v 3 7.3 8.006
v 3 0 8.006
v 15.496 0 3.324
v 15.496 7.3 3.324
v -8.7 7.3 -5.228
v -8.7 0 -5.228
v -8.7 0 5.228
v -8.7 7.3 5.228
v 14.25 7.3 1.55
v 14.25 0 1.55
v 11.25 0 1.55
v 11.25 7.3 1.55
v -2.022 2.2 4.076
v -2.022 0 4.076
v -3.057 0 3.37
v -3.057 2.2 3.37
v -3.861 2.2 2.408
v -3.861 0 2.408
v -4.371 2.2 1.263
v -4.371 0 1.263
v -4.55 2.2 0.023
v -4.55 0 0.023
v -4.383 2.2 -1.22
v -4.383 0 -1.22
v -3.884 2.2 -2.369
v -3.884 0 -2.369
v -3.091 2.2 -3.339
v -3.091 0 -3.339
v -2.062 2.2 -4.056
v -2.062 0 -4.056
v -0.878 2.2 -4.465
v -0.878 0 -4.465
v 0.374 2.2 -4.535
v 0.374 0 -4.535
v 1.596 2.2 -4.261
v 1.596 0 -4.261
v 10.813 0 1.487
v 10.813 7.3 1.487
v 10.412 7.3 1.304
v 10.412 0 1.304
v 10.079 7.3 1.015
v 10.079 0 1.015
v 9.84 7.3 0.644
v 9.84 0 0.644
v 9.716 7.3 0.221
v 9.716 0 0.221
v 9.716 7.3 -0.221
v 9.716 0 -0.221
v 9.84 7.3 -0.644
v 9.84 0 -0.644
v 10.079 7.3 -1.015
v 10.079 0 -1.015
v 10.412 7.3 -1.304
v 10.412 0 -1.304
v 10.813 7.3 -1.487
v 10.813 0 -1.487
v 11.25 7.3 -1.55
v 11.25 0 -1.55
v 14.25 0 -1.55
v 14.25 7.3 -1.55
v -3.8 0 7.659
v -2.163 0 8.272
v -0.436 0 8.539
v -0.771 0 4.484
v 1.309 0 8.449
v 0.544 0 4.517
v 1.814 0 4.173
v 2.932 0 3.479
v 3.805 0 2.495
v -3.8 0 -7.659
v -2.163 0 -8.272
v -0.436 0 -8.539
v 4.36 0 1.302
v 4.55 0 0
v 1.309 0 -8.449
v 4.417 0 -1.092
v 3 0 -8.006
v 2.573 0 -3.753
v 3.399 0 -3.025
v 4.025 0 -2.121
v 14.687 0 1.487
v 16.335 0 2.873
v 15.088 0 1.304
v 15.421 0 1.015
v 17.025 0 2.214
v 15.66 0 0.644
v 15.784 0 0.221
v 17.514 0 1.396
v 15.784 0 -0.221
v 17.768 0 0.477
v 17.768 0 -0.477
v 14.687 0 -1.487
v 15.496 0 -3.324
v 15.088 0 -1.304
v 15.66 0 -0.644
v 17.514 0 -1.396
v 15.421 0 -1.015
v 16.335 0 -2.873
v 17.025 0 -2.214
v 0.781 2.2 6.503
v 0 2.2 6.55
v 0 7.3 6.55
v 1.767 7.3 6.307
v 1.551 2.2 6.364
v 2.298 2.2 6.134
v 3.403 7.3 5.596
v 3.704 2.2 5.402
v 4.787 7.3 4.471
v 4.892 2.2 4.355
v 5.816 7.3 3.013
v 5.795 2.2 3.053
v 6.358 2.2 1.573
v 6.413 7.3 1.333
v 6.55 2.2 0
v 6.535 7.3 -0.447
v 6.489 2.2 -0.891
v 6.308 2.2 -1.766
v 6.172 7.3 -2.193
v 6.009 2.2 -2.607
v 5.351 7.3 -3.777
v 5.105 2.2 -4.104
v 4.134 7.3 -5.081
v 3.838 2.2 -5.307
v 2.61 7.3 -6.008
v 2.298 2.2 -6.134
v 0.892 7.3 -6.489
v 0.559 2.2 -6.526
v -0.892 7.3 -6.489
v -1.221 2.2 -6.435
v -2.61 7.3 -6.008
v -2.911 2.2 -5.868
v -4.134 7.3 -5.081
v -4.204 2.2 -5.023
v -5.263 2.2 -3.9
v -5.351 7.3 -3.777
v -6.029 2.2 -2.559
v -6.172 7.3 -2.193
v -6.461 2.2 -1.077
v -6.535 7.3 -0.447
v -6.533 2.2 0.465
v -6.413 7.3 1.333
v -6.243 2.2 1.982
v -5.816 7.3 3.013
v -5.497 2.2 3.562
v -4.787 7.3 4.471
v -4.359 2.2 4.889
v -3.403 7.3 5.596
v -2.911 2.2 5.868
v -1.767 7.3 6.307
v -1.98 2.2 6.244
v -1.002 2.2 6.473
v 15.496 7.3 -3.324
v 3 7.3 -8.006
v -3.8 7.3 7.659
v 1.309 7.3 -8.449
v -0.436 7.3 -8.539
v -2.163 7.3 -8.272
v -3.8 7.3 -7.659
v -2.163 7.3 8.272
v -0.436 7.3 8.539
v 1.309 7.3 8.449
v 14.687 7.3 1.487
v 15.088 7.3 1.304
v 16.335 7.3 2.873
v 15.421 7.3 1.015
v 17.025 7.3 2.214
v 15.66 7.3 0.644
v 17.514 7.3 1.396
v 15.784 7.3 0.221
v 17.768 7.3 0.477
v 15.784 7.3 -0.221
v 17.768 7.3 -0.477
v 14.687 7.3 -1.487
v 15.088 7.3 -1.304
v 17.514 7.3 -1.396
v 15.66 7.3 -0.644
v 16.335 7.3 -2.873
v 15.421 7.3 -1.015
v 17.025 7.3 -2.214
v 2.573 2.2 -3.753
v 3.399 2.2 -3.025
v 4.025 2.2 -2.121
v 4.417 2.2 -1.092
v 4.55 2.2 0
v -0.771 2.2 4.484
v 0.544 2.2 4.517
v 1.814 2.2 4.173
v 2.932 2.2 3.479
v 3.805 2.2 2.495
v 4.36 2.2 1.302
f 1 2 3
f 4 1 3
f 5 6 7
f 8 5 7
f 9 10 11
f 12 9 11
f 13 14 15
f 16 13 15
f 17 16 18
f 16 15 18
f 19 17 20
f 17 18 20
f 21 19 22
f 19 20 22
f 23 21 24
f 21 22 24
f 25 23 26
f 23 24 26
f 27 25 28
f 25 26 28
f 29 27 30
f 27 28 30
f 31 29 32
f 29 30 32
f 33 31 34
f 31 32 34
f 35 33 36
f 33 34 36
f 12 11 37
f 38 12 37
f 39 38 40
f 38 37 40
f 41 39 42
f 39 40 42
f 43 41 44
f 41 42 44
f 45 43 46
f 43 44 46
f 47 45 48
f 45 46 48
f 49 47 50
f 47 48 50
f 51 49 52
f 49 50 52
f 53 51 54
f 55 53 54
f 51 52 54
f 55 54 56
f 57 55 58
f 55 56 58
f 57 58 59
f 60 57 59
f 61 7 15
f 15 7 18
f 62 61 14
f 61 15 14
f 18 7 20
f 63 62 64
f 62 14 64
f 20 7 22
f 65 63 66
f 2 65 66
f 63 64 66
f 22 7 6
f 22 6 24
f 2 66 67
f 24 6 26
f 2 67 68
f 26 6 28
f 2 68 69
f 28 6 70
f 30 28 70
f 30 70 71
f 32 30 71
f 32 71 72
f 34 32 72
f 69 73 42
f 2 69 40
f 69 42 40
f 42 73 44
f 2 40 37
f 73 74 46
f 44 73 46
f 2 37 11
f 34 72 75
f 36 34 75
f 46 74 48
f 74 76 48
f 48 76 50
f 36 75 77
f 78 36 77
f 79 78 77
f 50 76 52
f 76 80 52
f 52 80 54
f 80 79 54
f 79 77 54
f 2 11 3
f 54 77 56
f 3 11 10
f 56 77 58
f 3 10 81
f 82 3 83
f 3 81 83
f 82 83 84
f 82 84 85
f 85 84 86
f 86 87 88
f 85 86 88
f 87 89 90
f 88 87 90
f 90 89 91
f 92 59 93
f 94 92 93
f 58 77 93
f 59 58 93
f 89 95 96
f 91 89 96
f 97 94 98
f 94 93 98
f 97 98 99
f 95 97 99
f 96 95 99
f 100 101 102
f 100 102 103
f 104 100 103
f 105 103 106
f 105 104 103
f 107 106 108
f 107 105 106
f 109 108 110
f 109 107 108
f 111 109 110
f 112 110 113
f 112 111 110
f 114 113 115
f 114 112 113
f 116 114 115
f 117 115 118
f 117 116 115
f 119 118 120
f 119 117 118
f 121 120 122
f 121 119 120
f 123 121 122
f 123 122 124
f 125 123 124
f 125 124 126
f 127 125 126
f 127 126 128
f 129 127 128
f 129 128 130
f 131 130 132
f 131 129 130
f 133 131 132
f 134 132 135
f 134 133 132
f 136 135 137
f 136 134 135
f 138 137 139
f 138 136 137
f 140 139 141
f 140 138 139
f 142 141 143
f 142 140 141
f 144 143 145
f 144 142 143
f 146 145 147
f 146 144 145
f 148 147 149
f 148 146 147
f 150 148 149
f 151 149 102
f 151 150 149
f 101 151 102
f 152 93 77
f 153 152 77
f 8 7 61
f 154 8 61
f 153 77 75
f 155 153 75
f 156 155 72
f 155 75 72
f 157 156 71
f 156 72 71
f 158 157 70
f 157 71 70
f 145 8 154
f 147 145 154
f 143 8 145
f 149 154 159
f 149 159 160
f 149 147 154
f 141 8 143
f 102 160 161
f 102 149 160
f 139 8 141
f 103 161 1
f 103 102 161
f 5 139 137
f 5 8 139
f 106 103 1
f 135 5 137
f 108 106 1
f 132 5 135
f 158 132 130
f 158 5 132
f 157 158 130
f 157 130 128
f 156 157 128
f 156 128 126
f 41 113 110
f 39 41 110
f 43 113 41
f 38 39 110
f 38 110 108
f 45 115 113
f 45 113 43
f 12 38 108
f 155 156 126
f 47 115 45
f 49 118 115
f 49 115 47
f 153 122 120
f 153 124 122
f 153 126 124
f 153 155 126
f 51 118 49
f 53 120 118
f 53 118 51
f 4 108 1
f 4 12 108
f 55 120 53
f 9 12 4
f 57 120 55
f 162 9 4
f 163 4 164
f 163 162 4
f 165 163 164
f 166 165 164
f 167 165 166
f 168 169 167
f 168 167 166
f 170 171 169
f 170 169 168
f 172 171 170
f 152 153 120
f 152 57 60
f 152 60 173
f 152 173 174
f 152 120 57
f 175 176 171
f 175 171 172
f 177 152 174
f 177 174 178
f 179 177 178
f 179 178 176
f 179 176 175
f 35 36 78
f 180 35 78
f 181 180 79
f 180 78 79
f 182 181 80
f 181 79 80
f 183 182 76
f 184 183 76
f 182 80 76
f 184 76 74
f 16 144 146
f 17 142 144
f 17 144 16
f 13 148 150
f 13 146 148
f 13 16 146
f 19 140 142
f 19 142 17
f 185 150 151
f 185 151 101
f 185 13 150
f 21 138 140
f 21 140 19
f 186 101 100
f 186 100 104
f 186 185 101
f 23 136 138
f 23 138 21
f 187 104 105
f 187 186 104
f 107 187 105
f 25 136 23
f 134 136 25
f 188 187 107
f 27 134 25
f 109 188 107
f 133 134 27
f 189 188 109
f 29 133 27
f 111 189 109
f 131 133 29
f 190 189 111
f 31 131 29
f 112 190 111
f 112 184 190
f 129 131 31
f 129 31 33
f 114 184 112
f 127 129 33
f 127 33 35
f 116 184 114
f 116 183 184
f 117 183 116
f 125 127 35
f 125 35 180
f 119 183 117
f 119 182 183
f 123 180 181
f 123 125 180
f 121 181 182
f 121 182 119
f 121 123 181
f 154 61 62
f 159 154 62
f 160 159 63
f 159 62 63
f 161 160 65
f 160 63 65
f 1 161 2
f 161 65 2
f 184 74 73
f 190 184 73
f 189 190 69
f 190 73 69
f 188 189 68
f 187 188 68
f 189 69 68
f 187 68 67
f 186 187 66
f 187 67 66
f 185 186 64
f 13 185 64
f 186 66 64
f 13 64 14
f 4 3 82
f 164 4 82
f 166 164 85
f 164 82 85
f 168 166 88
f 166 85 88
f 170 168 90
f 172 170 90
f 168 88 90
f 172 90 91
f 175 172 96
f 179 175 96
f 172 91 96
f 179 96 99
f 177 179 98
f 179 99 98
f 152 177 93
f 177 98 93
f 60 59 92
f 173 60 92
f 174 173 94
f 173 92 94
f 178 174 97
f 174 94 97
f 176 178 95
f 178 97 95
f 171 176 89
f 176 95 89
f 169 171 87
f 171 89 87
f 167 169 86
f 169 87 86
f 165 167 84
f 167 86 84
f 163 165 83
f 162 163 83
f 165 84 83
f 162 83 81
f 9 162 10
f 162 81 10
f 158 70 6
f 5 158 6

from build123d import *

# Parameters (mm, degrees)
SKETCH1_R     = 6.55
BODY_DEPTH    = 7.3
FLOOR_2_DEPTH = 2.2


with BuildPart() as part:
    # Sketch1 → Body (new body)
    with BuildSketch(Plane(origin=(0, 0, 0), x_dir=(1, 0, 0), z_dir=(0, 1, 0))):
        with BuildLine():
            Line((3, -8.006403687), (15.495614035, -3.324296268))
            ThreePointArc((15.495614035, -3.324296268), (17.8, 0), (15.495614035, 3.324296268))
            Line((15.495614035, 3.324296268), (3, 8.006403687))
            ThreePointArc((3, 8.006403687), (-0.436058681, 8.538873042), (-3.8, 7.659144861))
            Line((-3.8, 7.659144861), (-8.7, 5.228064063))
            Line((-8.7, 5.228064063), (-8.7, -5.228064063))
            Line((-8.7, -5.228064063), (-3.8, -7.659144861))
            ThreePointArc((-3.8, -7.659144861), (-0.436058681, -8.538873042), (3, -8.006403687))
        make_face()
        with Locations(Location((0, 0, 0), (0, 0, 270))):
            Circle(SKETCH1_R, mode=Mode.SUBTRACT)
        with BuildLine():
            Line((11.25, 1.55), (14.25, 1.55))
            ThreePointArc((14.25, 1.55), (15.8, 0), (14.25, -1.55))
            Line((14.25, -1.55), (11.25, -1.55))
            ThreePointArc((11.25, -1.55), (9.7, 0), (11.25, 1.55))
        make_face(mode=Mode.SUBTRACT)
    extrude(amount=BODY_DEPTH)

    # Sketch1<4> → Floor 2 (add)
    with BuildSketch(Plane(origin=(0, 0, 0), x_dir=(1, 0, 0), z_dir=(0, 1, 0))):
        with BuildLine():
            ThreePointArc((6.55, 0), (6.413226158, 1.33155182), (6.008616718, 2.607494034))
            Line((6.008616718, 2.607494034), (1.596491228, 4.260717752))
            ThreePointArc((1.596491228, 4.260717752), (3.73942075, 2.592148232), (4.55, 0))
            ThreePointArc((4.55, 0), (2.398060559, -3.866756464), (-2.022222222, -4.075919195))
            Line((-2.022222222, -4.075919195), (-6.242982203, -1.981835819))
            ThreePointArc((-6.242982203, -1.981835819), (-4.972324895, -4.263623476), (-2.911111111, -5.867532028))
            ThreePointArc((-2.911111111, -5.867532028), (-0.33405665, -6.541475839), (2.298245614, -6.133560719))
            ThreePointArc((2.298245614, -6.133560719), (5.383122178, -3.731554048), (6.55, 0))
        make_face()
        with BuildLine():
            Line((1.596491228, 4.260717752), (6.008616718, 2.607494034))
            ThreePointArc((6.008616718, 2.607494034), (4.512125554, 4.747970407), (2.298245614, 6.133560719))
            ThreePointArc((2.298245614, 6.133560719), (-0.33405665, 6.541475839), (-2.911111111, 5.867532028))
            ThreePointArc((-2.911111111, 5.867532028), (-6.029303442, 2.559296778), (-6.242982203, -1.981835819))
            Line((-6.242982203, -1.981835819), (-2.022222222, -4.075919195))
            ThreePointArc((-2.022222222, -4.075919195), (-4.173750186, 1.811714488), (1.596491228, 4.260717752))
        make_face()
    extrude(amount=FLOOR_2_DEPTH)


solid = part.part
